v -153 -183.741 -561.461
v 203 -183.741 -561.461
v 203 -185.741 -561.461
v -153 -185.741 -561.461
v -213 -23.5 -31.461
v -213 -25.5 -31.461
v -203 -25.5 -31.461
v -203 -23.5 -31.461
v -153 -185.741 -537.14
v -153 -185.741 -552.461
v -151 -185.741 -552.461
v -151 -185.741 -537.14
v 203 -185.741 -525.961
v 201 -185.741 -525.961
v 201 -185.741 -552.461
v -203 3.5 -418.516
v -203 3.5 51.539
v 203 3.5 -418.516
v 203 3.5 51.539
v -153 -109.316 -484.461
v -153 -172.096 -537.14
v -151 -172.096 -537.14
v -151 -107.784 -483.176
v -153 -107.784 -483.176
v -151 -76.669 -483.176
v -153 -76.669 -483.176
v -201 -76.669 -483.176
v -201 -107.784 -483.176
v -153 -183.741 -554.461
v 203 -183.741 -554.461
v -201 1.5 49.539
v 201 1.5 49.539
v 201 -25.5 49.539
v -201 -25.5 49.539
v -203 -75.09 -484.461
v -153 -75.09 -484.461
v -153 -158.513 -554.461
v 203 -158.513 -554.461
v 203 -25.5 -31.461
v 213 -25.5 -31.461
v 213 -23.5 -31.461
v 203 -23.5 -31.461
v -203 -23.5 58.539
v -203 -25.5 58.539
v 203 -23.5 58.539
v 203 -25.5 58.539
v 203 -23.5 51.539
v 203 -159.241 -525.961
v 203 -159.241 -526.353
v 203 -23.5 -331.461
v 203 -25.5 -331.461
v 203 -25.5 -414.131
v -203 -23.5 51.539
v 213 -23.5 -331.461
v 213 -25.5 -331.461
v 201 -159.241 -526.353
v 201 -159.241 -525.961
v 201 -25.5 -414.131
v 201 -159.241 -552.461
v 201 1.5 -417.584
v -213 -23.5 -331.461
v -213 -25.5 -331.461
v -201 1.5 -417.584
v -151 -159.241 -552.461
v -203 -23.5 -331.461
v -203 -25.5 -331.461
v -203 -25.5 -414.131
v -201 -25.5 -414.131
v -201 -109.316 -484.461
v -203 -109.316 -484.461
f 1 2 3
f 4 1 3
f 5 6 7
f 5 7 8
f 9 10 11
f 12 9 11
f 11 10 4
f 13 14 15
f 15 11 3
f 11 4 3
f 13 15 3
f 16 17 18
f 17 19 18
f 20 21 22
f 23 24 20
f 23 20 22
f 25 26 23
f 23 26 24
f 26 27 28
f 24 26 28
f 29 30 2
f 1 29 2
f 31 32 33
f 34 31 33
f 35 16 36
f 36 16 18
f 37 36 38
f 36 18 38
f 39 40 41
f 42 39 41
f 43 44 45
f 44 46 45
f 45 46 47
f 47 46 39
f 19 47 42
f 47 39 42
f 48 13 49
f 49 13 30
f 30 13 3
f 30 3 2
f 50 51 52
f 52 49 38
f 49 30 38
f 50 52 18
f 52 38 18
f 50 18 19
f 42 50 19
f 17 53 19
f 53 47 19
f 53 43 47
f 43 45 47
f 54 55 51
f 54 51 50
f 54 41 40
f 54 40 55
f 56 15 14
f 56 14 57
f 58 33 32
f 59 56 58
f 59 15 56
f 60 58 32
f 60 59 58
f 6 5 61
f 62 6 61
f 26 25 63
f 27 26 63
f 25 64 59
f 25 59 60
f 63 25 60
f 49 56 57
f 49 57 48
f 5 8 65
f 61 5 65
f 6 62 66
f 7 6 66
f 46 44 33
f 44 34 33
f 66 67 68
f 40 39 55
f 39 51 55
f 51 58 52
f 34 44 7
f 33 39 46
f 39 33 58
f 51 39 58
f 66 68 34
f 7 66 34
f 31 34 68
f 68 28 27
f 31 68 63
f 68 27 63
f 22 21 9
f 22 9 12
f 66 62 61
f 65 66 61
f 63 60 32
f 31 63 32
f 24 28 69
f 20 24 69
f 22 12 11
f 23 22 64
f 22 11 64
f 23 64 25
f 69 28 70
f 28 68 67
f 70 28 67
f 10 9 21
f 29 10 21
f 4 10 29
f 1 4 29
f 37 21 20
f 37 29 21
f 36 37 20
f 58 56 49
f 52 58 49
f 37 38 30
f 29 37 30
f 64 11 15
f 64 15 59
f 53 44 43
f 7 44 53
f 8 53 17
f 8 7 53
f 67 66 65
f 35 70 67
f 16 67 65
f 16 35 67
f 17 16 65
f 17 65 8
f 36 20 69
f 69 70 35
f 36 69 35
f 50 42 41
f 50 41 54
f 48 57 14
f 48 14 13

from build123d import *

# Parameters (mm, degrees)
BOSS_EXTRUDE1_DEPTH  = 203
SKETCH4_W            = 2
SKETCH4_H            = 467.122613679
BOSS_EXTRUDE4_DEPTH  = 27
SKETCH5_W            = 2
SKETCH5_H            = 209.8319636
BOSS_EXTRUDE5_DEPTH  = 20
SKETCH6_W            = 2
SKETCH6_H            = 26.5
BOSS_EXTRUDE6_DEPTH  = 26.5
SKETCH14_W           = 300
SKETCH14_H           = 2
BOSS_EXTRUDE10_DEPTH = 10
SKETCH8_W            = 50
SKETCH8_H            = 77
CUT_EXTRUDE1_DEPTH   = 189.24061
BOSS_EXTRUDE7_DEPTH  = 48
SKETCH11_W           = 2
SKETCH11_H           = 107.789220226
BOSS_EXTRUDE8_DEPTH  = 20
CUT_EXTRUDE2_DEPTH   = 2
SKETCH13_W           = 2
SKETCH13_H           = 26.5
BOSS_EXTRUDE9_DEPTH  = 15.320889


with BuildPart() as part:
    # Sketch2 → Boss-Extrude1 (new body)
    with BuildSketch(Plane(origin=(0, 0, 0), x_dir=(0, 0, -1), z_dir=(1, 0, 0))):
        Polygon((-49.538744354, 1.5), (-49.538744354, -25.5), (-58.538744354, -25.5), (-58.538744354, -23.5), (-51.538744354, -23.5), (-51.538744354, 3.5), (418.516484641, 3.5), (554.461255643, -158.512669236), (554.461255643, -183.740609705), (561.461255643, -183.740609705), (561.461255643, -185.740609705), (552.461255643, -185.740609705), (552.461255643, -159.240609705), (417.583869325, 1.5), align=None)
    boss_extrude1 = extrude(amount=BOSS_EXTRUDE1_DEPTH)

    # Sketch4 → Boss-Extrude4 (add)
    with BuildSketch(Plane(origin=(0, 1.5, 0), x_dir=(-1, 0, 0), z_dir=(0, -1, 0))):
        with Locations((-202, 184.022562486)):
            Rectangle(SKETCH4_W, SKETCH4_H)
    boss_extrude4 = extrude(amount=BOSS_EXTRUDE4_DEPTH)

    # Sketch5 → Boss-Extrude5 (add)
    with BuildSketch(Plane(origin=(0, 206.239679889, -245.786879443), x_dir=(1, 0, 0), z_dir=(0, -0.6427876096865444, 0.7660444431189738))):
        with Locations((202, -372.184652342)):
            Rectangle(SKETCH5_W, SKETCH5_H)
    boss_extrude5 = extrude(amount=BOSS_EXTRUDE5_DEPTH)

    # Sketch6 → Boss-Extrude6 (add)
    with BuildSketch(Plane.XY.offset(-552.461255643)):
        with Locations((202, -172.490609705)):
            Rectangle(SKETCH6_W, SKETCH6_H)
    boss_extrude6 = extrude(amount=BOSS_EXTRUDE6_DEPTH)

    # Sketch14 → Boss-Extrude10 (add)
    with BuildSketch(Plane(origin=(203, 0, 0), x_dir=(0, 0, -1), z_dir=(1, 0, 0))):
        with Locations((181.461255646, -24.5)):
            Rectangle(SKETCH14_W, SKETCH14_H)
    boss_extrude10 = extrude(amount=BOSS_EXTRUDE10_DEPTH)

    # Mirror3: Boss-Extrude1, Boss-Extrude4, Boss-Extrude5, Boss-Extrude6, Boss-Extrude10 across plane
    add(boss_extrude1.mirror(Plane(origin=(0, 0, 0), x_dir=(0, 0, 1), z_dir=(1, 0, 0))))
    add(boss_extrude4.mirror(Plane(origin=(0, 0, 0), x_dir=(0, 0, 1), z_dir=(1, 0, 0))))
    add(boss_extrude5.mirror(Plane(origin=(0, 0, 0), x_dir=(0, 0, 1), z_dir=(1, 0, 0))))
    add(boss_extrude6.mirror(Plane(origin=(0, 0, 0), x_dir=(0, 0, 1), z_dir=(1, 0, 0))))
    add(boss_extrude10.mirror(Plane(origin=(0, 0, 0), x_dir=(0, 0, 1), z_dir=(1, 0, 0))))

    # Sketch8 → Cut-Extrude1 (cut)
    with BuildSketch(Plane(origin=(0, 3.5, 0), x_dir=(1, 0, 0), z_dir=(0, 1, 0))):
        with Locations((-178, 522.961255643)):
            Rectangle(SKETCH8_W, SKETCH8_H)
    extrude(amount=-CUT_EXTRUDE1_DEPTH, mode=Mode.SUBTRACT)

    # Sketch10 → Boss-Extrude7 (add)
    with BuildSketch(Plane(origin=(-201, 0, 0), x_dir=(0, 0, -1), z_dir=(1, 0, 0))):
        Polygon((484.461255643, -109.315841945), (484.461255643, -78.201365408), (483.175680424, -76.669276522), (483.175680424, -107.783753059), align=None)
    extrude(amount=BOSS_EXTRUDE7_DEPTH)

    # Sketch11 → Boss-Extrude8 (add)
    with BuildSketch(Plane(origin=(0, 206.239679889, -245.786879443), x_dir=(1, 0, 0), z_dir=(0, -0.6427876096865444, 0.7660444431189738))):
        with Locations((-152, -423.206024029)):
            Rectangle(SKETCH11_W, SKETCH11_H)
    extrude(amount=BOSS_EXTRUDE8_DEPTH)

    # Sketch12 → Cut-Extrude2 (cut)
    with BuildSketch(Plane.ZY.offset(153)):
        Polygon((-483.175680424, -76.669276522), (-483.175680424, -107.783753059), (-467.854791561, -89.525028716), align=None)
    extrude(amount=-CUT_EXTRUDE2_DEPTH, mode=Mode.SUBTRACT)

    # Sketch13 → Boss-Extrude9 (add)
    with BuildSketch(Plane.XY.offset(-552.461255643)):
        with Locations((-152, -172.490609705)):
            Rectangle(SKETCH13_W, SKETCH13_H)
    extrude(amount=BOSS_EXTRUDE9_DEPTH)


solid = part.part
